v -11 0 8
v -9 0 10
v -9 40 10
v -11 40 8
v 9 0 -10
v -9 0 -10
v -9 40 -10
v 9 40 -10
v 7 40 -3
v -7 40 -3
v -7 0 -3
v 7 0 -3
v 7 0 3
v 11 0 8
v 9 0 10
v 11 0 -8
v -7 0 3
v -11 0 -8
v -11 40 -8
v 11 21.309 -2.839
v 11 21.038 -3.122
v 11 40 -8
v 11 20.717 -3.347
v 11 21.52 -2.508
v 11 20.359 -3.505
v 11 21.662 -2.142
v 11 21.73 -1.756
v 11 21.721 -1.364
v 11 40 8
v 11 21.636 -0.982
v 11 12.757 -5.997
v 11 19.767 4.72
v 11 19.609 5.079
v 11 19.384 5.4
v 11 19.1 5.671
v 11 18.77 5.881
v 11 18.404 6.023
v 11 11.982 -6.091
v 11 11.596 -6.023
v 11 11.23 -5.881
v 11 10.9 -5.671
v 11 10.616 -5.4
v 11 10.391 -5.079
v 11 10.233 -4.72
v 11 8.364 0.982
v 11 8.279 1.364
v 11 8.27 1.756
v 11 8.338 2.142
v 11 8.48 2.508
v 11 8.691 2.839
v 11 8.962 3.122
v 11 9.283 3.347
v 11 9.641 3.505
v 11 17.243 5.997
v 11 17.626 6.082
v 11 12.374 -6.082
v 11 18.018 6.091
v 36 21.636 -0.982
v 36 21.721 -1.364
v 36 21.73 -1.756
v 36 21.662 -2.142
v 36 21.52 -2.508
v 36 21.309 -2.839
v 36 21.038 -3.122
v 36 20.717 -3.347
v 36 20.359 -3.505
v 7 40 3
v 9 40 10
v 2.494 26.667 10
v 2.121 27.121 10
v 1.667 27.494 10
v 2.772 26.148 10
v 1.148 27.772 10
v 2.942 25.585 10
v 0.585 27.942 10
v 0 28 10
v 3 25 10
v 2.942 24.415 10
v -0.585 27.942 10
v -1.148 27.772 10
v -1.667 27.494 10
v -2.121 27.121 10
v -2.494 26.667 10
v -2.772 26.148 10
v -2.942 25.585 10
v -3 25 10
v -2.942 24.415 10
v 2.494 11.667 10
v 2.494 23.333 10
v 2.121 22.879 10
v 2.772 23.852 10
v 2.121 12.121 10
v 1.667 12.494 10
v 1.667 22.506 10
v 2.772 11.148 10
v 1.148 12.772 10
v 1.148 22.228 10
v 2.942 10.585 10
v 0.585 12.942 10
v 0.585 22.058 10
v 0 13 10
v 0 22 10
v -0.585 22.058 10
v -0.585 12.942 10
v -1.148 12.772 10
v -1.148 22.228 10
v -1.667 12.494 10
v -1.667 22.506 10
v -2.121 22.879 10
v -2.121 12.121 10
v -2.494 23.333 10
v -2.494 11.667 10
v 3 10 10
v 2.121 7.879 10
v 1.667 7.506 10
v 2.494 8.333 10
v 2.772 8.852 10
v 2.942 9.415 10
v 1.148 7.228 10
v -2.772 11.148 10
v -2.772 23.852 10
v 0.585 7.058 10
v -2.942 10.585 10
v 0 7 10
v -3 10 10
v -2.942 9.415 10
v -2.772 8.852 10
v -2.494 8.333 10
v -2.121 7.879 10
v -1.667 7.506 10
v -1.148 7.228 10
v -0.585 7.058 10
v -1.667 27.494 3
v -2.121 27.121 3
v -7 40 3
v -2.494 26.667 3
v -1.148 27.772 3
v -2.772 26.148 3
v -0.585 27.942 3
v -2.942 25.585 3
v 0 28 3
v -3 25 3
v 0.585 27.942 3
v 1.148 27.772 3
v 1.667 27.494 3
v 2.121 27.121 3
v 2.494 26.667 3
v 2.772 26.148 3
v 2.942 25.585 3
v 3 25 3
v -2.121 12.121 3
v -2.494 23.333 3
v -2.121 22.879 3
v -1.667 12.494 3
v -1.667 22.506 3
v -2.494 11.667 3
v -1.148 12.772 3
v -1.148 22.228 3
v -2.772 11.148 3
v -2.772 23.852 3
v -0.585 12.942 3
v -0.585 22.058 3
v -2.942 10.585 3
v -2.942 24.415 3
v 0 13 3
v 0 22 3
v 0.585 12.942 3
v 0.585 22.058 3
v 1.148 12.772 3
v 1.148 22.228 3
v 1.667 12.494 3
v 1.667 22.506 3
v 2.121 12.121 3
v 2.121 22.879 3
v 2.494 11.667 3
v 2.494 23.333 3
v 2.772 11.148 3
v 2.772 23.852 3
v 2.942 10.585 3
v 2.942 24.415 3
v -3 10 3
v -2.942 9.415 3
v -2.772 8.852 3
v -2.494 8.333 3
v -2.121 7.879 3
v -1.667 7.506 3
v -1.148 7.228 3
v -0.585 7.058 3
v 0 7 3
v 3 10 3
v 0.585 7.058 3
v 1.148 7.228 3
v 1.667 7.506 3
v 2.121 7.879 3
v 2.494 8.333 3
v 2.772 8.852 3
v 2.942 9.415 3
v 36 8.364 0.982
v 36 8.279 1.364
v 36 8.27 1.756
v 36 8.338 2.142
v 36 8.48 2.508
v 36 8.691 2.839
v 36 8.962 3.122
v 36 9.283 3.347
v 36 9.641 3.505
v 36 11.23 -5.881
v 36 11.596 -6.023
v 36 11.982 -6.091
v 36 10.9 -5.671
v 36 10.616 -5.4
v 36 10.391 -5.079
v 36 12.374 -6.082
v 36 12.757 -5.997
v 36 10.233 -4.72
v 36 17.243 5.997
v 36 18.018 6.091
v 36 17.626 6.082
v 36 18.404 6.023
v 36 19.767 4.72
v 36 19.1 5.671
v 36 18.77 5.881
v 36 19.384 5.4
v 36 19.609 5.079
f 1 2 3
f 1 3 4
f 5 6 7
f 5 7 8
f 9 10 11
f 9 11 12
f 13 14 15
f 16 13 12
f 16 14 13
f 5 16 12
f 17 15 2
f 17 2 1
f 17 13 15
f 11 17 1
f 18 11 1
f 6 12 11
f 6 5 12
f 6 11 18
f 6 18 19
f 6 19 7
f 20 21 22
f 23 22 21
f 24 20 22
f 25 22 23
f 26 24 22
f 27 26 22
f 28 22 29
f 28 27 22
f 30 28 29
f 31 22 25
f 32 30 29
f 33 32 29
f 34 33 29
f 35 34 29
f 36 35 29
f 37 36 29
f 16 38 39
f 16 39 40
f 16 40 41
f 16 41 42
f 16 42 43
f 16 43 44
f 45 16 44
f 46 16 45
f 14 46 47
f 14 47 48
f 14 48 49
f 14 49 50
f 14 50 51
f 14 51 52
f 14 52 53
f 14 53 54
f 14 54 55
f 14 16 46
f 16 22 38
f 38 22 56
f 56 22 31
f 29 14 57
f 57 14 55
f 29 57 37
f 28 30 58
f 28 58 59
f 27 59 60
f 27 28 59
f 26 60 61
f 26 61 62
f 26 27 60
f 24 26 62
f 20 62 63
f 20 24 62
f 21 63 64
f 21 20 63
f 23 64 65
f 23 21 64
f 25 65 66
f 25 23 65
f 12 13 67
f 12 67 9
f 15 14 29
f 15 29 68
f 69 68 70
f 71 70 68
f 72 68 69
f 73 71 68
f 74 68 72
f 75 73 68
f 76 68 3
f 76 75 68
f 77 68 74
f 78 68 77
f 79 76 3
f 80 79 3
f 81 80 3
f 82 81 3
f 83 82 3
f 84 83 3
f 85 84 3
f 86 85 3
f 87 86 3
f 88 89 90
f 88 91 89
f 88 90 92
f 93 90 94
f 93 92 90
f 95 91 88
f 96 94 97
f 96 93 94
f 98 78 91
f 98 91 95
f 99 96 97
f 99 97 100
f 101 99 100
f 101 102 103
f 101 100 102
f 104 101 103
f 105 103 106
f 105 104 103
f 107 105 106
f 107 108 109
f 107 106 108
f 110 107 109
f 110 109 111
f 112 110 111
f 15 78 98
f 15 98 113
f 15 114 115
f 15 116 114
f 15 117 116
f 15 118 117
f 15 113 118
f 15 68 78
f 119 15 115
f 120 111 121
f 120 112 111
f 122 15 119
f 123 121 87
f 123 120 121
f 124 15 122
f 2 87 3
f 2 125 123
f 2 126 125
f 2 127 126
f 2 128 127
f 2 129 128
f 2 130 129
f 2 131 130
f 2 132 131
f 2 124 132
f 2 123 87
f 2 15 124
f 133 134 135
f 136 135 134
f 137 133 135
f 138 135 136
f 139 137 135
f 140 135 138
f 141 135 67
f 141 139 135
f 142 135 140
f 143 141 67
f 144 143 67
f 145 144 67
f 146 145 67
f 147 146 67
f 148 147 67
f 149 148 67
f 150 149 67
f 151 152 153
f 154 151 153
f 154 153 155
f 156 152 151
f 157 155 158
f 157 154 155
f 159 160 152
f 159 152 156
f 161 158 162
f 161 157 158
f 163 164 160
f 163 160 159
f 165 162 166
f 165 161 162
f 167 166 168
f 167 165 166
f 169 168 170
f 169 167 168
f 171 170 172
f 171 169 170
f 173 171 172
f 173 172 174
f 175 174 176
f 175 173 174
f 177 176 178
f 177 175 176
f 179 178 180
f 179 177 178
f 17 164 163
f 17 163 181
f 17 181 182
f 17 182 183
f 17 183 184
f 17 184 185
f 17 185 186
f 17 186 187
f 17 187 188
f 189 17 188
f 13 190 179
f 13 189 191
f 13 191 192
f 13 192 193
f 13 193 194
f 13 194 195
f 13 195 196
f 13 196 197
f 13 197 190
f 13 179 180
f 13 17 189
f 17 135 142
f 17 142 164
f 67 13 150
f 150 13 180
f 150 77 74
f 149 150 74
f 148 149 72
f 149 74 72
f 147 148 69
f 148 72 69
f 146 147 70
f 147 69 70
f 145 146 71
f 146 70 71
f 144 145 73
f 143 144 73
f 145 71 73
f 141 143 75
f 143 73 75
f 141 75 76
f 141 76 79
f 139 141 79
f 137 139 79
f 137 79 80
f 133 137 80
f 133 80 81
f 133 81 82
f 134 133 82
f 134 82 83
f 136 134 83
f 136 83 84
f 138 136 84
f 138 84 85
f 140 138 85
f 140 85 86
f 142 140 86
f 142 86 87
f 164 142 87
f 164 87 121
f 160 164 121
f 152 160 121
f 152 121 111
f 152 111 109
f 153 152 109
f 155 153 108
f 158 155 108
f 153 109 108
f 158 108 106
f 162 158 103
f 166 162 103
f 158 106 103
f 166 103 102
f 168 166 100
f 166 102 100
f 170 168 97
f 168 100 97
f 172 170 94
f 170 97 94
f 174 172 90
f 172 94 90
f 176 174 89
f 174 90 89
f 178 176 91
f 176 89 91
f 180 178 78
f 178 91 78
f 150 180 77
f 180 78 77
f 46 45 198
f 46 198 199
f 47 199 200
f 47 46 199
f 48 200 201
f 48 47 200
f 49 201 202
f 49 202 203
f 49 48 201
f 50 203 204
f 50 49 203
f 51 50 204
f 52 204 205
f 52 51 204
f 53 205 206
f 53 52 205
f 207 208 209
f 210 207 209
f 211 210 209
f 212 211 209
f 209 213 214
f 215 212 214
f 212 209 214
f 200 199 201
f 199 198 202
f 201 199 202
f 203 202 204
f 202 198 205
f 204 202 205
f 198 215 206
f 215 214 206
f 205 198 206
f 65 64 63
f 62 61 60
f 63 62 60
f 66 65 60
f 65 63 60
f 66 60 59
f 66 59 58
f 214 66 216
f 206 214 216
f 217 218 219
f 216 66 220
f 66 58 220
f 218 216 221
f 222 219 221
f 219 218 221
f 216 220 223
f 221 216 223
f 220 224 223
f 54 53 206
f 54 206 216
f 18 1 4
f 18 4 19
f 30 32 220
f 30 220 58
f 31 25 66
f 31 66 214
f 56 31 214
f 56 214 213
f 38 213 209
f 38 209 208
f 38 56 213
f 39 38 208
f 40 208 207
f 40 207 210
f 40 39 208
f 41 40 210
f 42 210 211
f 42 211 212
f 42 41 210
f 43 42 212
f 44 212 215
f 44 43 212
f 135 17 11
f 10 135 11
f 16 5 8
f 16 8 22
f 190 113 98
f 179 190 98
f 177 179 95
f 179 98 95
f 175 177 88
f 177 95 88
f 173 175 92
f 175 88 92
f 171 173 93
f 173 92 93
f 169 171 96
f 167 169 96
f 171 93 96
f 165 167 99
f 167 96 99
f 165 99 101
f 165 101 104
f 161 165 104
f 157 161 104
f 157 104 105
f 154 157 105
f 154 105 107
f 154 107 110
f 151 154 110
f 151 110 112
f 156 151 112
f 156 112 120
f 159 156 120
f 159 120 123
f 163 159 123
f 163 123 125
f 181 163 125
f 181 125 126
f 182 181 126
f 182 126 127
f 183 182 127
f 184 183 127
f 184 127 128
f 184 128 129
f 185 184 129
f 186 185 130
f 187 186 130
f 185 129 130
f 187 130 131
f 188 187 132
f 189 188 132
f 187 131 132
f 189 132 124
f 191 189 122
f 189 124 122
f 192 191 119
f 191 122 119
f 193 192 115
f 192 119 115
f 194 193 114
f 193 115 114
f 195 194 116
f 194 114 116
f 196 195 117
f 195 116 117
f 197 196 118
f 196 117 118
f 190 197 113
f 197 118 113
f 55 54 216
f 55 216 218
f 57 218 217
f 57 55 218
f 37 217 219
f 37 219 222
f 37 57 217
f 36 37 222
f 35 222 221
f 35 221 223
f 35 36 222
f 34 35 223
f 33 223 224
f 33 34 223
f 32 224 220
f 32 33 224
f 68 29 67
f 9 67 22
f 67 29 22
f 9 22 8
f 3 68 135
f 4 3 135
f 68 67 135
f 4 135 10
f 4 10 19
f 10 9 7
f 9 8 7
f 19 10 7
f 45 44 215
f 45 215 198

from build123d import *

# Parameters (mm, degrees)
CROQUIS1_W              = 14
CROQUIS1_H              = 6
SALIENTE_EXTRUIR1_DEPTH = 40
SALIENTE_EXTRUIR4_DEPTH = 25
CORTAR_EXTRUIR1_REACH   = 59.411
CROQUIS3_R              = 3


with BuildPart() as part:
    # Croquis1 → Saliente-Extruir1 (new body)
    with BuildSketch(Plane(origin=(0, 0, 0), x_dir=(1, 0, 0), z_dir=(0, 1, 0))):
        Polygon((-11, 8), (-9, 10), (9, 10), (11, 8), (11, -8), (9, -10), (-9, -10), (-11, -8), align=None)
        Rectangle(CROQUIS1_W, CROQUIS1_H, mode=Mode.SUBTRACT)
    extrude(amount=SALIENTE_EXTRUIR1_DEPTH)

    # Croquis2 → Saliente-Extruir4 (add)
    with BuildSketch(Plane(origin=(11, 0, 0), x_dir=(0, 0, -1), z_dir=(1, 0, 0))):
        with BuildLine():
            Line((-3.505117141, 9.641441068), (-5.99727833, 17.243357445))
            ThreePointArc((-5.99727833, 17.243357445), (-5.88119691, 18.769683379), (-4.719839533, 19.766876837))
            Line((-4.719839533, 19.766876837), (0.98159775, 21.635997729))
            ThreePointArc((0.98159775, 21.635997729), (2.507923683, 21.519916309), (3.505117141, 20.358558932))
            Line((3.505117141, 20.358558932), (5.99727833, 12.756642555))
            ThreePointArc((5.99727833, 12.756642555), (5.88119691, 11.230316621), (4.719839533, 10.233123163))
            Line((4.719839533, 10.233123163), (-0.98159775, 8.364002271))
            ThreePointArc((-0.98159775, 8.364002271), (-2.507923683, 8.480083691), (-3.505117141, 9.641441068))
        make_face()
    extrude(amount=SALIENTE_EXTRUIR4_DEPTH)

    # Croquis3 → Cortar-Extruir1 (cut, up to next)
    with BuildSketch(Plane.XY.offset(10), mode=Mode.PRIVATE) as cortar_extruir1_sk1:
        with Locations((0, 10)):
            Circle(CROQUIS3_R)
    cortar_extruir1_tool1 = extrude(cortar_extruir1_sk1.sketch, amount=-CORTAR_EXTRUIR1_REACH, mode=Mode.PRIVATE) & part.part
    # Croquis3 → Cortar-Extruir1 (cut, up to next)
    with BuildSketch(Plane.XY.offset(10), mode=Mode.PRIVATE) as cortar_extruir1_sk2:
        with Locations((0, 25)):
            Circle(CROQUIS3_R)
    cortar_extruir1_tool2 = extrude(cortar_extruir1_sk2.sketch, amount=-CORTAR_EXTRUIR1_REACH, mode=Mode.PRIVATE) & part.part
    add(cortar_extruir1_tool1.solids().sort_by_distance((0, 10, 10))[0], mode=Mode.SUBTRACT)
    add(cortar_extruir1_tool2.solids().sort_by_distance((0, 25, 10))[0], mode=Mode.SUBTRACT)


solid = part.part
